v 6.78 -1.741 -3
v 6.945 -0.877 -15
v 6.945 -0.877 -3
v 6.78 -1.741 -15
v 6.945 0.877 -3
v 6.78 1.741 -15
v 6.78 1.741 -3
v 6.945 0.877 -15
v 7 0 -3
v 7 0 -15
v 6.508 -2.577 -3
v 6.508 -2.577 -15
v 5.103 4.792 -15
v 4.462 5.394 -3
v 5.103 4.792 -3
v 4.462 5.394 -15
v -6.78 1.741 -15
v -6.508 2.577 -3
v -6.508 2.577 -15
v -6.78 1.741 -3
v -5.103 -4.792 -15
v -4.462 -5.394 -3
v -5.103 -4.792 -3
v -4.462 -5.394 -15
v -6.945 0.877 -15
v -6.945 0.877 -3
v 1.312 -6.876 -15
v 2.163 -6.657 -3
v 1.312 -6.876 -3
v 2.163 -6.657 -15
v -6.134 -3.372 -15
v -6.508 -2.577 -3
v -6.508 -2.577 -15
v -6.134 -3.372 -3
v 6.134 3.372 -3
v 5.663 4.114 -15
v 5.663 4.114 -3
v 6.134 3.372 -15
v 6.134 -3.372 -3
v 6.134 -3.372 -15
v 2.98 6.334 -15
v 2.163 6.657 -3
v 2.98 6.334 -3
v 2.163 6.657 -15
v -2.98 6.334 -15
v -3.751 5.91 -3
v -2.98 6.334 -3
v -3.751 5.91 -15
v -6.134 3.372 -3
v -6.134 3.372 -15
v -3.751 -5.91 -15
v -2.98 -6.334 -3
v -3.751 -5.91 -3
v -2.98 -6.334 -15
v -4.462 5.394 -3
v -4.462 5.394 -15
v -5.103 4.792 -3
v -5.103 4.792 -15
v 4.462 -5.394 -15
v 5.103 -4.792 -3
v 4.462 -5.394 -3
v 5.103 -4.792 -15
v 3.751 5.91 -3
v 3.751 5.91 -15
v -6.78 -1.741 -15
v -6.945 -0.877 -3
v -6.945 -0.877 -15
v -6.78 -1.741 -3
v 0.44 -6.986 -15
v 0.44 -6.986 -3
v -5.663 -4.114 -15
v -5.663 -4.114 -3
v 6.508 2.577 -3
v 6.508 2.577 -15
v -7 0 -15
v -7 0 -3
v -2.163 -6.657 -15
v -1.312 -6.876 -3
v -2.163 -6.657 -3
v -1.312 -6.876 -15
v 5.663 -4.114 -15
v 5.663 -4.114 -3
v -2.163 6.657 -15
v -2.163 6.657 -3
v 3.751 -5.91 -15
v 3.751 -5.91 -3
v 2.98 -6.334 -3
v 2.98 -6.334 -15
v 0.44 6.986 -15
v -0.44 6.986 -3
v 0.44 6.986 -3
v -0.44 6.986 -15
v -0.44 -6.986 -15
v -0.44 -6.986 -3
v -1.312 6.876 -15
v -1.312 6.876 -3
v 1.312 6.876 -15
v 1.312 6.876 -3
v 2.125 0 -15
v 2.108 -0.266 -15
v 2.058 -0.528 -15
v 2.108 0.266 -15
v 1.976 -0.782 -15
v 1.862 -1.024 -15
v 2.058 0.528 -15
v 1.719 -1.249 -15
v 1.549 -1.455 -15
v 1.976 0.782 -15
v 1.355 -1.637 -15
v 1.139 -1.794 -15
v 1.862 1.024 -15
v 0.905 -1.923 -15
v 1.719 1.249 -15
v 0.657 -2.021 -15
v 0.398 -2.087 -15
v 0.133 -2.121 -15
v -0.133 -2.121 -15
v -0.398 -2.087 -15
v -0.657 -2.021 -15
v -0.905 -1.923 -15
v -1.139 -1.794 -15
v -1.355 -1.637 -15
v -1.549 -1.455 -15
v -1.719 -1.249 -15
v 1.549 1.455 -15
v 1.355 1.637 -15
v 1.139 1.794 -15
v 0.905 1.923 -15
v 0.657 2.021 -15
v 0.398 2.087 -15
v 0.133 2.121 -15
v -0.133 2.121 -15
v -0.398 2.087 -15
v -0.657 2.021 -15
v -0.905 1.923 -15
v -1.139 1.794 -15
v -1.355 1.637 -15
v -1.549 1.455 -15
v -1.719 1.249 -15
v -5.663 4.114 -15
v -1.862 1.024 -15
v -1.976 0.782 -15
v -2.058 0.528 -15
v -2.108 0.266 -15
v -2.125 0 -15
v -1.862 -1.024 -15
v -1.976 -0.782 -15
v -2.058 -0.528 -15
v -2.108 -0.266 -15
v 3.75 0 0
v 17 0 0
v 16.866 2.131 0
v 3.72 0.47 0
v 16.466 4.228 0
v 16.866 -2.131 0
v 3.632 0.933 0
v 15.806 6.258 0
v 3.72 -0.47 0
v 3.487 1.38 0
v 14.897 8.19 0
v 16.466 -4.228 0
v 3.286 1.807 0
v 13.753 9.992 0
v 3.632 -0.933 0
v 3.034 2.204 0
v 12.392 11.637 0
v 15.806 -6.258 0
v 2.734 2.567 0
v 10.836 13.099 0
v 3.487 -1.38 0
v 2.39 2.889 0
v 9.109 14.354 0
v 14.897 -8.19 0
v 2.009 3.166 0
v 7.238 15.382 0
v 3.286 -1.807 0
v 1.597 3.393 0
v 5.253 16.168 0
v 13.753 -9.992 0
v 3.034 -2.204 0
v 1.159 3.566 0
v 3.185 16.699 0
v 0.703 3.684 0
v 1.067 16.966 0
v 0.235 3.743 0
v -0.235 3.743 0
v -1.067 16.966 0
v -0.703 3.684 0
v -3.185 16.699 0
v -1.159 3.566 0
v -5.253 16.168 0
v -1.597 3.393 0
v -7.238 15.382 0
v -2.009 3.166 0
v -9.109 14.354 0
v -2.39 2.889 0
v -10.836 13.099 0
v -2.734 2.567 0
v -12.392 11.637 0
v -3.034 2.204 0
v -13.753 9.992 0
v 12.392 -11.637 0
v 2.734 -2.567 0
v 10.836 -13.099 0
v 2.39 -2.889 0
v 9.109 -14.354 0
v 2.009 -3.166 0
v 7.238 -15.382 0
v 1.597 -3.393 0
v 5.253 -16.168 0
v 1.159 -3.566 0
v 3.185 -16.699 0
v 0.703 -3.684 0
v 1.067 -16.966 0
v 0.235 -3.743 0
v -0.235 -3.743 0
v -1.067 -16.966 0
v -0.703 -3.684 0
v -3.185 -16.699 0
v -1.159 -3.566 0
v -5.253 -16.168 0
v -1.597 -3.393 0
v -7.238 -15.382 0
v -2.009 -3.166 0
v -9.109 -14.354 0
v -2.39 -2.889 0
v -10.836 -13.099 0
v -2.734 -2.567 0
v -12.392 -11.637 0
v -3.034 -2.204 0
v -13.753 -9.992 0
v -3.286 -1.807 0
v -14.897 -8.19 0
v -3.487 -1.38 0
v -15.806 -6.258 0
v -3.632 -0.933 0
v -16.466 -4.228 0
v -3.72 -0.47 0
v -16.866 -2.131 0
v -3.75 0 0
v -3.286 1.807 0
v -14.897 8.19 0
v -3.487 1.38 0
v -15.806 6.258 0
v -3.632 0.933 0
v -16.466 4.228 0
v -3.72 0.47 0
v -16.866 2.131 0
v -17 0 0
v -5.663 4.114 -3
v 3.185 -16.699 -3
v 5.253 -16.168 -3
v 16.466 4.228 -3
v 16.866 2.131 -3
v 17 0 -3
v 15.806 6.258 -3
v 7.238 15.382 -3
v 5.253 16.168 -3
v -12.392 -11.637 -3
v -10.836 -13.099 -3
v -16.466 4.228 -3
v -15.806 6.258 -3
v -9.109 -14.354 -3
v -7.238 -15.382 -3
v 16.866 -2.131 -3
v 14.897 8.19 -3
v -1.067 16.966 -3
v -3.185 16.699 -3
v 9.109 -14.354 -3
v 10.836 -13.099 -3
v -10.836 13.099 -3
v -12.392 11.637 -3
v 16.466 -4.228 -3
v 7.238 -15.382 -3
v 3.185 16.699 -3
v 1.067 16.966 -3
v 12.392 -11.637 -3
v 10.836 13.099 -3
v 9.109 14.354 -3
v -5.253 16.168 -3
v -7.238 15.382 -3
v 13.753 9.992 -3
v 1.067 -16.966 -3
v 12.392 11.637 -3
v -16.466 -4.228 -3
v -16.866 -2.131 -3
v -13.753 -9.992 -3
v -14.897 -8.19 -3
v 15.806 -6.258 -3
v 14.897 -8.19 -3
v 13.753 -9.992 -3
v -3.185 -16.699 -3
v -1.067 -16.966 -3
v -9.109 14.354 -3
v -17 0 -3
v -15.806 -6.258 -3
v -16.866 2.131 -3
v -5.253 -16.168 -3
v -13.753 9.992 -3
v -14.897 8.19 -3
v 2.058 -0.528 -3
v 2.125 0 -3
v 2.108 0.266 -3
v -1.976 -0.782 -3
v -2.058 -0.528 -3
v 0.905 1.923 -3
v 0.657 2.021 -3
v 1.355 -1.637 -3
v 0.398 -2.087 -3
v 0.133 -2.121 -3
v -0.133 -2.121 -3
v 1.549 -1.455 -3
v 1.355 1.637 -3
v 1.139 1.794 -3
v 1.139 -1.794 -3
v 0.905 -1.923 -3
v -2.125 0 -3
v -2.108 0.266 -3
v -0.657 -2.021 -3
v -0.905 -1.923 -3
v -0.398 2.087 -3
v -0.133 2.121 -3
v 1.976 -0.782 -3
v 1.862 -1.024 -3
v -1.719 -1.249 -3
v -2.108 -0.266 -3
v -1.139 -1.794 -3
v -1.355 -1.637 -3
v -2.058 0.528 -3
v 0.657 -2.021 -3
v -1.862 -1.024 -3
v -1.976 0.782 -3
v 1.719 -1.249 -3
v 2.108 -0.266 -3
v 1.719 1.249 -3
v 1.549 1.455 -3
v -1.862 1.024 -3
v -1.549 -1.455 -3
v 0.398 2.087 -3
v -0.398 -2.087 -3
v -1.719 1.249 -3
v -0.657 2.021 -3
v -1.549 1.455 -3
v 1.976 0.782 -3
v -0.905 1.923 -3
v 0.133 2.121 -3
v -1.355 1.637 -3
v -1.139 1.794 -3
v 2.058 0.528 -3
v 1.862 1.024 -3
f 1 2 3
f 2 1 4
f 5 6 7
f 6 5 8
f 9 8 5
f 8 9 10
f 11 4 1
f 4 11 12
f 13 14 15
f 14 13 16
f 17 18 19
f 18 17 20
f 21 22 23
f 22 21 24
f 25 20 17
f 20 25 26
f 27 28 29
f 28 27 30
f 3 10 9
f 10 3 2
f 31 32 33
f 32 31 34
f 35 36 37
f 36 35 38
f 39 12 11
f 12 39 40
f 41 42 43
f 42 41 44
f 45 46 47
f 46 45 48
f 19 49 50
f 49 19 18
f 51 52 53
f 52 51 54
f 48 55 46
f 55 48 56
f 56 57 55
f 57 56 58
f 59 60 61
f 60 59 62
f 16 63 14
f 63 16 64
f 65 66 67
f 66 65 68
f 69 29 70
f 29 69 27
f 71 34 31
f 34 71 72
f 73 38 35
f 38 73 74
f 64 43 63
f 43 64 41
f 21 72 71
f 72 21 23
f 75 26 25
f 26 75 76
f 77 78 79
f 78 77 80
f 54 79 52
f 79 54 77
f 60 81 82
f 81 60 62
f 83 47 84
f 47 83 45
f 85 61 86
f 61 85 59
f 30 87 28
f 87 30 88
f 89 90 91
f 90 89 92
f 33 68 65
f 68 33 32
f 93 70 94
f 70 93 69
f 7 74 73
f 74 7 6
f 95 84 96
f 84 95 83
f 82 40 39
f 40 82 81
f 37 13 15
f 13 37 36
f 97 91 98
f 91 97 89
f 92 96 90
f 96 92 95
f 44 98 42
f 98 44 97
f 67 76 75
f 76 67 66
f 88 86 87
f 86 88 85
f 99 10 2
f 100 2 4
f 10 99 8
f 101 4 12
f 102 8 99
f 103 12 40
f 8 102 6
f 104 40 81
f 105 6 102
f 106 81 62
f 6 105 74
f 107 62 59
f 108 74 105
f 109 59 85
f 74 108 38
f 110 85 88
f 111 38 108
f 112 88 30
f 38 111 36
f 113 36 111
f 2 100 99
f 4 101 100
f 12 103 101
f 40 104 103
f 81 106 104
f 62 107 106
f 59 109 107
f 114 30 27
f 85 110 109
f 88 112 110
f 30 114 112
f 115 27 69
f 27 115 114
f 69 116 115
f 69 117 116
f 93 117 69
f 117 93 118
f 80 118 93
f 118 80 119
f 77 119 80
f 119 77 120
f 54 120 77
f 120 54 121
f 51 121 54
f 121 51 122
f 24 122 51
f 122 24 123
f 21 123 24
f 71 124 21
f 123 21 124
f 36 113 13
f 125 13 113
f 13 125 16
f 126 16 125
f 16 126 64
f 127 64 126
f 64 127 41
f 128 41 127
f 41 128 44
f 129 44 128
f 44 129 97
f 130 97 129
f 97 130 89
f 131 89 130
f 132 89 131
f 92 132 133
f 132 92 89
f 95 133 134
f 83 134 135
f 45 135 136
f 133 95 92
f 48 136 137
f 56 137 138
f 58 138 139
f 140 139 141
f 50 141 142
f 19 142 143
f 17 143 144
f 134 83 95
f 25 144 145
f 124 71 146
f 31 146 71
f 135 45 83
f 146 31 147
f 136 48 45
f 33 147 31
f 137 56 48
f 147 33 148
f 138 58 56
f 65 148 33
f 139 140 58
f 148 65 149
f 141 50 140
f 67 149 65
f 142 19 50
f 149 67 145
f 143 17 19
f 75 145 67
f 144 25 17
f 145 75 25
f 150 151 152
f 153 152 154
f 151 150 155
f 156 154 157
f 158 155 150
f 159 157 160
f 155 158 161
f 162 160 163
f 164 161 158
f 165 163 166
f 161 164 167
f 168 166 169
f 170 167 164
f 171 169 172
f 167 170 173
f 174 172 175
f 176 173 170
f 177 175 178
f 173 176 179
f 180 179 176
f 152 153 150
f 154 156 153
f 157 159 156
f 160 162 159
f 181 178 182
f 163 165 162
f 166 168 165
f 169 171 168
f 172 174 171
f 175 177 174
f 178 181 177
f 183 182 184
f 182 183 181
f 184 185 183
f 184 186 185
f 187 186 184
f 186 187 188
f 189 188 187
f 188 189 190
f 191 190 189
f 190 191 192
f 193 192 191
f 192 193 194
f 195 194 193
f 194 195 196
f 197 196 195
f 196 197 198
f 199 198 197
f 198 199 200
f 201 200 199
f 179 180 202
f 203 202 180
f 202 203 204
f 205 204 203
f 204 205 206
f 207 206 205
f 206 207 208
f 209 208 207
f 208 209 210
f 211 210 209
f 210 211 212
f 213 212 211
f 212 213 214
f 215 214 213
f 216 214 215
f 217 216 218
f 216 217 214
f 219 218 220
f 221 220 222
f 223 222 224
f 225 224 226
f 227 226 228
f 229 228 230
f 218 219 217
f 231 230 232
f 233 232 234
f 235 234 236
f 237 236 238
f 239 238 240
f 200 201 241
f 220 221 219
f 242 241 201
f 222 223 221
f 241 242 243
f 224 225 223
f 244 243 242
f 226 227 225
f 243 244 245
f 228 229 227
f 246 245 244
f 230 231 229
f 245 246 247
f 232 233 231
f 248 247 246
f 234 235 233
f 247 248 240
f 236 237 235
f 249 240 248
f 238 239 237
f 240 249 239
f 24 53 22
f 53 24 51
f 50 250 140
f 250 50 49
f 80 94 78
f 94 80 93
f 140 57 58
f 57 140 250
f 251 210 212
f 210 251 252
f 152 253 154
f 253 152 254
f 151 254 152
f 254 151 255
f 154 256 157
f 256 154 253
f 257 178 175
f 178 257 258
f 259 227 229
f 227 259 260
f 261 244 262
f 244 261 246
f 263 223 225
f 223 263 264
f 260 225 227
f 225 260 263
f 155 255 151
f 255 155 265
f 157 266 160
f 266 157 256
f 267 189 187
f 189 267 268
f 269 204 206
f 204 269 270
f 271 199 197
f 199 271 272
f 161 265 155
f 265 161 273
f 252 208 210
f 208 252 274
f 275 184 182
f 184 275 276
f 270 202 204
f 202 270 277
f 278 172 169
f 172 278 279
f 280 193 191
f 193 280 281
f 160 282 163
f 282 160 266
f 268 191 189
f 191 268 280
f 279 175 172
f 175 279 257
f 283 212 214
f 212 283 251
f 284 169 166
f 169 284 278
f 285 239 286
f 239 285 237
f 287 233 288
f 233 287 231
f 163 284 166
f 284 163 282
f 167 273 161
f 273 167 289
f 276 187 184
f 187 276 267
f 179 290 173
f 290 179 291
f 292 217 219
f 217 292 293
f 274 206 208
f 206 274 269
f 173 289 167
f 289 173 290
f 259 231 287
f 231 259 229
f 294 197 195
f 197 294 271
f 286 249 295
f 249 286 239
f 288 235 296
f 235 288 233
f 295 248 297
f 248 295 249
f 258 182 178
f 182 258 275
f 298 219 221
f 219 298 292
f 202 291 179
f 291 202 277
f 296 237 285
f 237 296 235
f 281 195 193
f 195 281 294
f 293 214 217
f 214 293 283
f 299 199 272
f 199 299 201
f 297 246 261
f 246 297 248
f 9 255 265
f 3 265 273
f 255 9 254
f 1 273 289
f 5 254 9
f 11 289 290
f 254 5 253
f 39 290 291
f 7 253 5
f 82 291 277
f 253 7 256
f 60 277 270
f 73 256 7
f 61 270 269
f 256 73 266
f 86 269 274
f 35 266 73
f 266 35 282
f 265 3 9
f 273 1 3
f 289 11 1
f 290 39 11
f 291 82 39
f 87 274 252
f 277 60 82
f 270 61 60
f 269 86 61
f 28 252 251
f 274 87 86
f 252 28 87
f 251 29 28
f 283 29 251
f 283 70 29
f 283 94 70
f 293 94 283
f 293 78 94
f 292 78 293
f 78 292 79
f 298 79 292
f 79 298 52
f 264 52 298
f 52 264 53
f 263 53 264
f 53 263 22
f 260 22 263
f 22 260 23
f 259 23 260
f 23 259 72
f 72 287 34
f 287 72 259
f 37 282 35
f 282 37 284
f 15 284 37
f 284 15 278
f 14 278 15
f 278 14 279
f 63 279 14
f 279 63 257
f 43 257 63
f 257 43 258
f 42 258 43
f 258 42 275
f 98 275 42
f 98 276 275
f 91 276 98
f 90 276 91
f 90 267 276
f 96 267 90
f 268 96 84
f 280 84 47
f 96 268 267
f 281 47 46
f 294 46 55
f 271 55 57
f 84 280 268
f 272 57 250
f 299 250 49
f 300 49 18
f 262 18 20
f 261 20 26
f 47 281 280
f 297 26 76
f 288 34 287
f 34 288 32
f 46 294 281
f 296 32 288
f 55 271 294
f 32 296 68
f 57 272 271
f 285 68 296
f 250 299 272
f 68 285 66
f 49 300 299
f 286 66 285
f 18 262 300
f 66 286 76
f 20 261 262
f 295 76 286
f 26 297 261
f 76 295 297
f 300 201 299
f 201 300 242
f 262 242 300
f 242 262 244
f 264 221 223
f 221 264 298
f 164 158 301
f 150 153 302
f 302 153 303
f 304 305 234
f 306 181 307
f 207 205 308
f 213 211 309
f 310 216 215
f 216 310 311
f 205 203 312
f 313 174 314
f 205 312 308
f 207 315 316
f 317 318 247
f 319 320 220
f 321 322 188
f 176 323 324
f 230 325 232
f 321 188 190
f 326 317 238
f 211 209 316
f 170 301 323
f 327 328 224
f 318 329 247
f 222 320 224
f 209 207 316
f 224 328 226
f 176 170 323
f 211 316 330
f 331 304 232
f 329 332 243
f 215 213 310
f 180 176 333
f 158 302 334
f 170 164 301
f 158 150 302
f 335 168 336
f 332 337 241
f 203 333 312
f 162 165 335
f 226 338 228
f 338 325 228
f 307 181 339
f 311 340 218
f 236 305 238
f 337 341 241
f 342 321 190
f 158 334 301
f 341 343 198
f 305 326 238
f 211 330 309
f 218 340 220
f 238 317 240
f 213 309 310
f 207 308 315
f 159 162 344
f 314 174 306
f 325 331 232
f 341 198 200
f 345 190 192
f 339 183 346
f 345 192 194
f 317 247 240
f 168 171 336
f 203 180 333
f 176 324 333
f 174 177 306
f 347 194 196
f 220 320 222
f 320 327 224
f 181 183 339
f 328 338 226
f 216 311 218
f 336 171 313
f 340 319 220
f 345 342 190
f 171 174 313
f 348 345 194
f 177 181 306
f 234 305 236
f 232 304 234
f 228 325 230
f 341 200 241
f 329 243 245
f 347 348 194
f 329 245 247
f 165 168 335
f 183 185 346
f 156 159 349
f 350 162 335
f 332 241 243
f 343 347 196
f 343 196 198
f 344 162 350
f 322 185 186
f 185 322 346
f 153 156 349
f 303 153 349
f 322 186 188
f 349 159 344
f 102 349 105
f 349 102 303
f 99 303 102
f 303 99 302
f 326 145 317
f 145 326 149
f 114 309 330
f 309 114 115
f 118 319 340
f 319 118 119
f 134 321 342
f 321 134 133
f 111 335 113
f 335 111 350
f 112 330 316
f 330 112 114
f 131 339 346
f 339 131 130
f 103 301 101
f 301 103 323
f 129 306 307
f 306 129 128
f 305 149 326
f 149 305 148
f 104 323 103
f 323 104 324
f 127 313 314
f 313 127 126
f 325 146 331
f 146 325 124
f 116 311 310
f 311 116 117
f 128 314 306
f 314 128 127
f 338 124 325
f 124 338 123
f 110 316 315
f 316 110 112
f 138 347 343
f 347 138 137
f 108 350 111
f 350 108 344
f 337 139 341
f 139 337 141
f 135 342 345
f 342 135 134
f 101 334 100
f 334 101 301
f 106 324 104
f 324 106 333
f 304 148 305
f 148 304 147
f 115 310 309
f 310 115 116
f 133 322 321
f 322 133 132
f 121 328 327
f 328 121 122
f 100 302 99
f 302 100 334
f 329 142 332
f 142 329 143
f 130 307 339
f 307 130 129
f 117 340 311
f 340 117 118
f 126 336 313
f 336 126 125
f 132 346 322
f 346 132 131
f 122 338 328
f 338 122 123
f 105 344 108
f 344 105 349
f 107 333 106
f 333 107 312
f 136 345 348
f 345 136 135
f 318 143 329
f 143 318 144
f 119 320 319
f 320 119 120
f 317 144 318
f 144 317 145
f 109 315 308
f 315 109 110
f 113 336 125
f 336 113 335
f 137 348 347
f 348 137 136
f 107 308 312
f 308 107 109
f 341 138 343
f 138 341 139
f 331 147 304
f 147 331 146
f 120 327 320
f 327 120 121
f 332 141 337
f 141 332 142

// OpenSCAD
$fn = 50;


difference() {
	union() {
		translate(v = [0, 0, -15.0000000000]) {
			cylinder(h = 15, r = 7.0000000000);
		}
		translate(v = [0, 0, -3.0000000000]) {
			cylinder(h = 3, r = 17.0000000000);
		}
	}
	union() {
		translate(v = [0, 0, 0]) {
			rotate(a = [0, 0, 0]) {
				difference() {
					union() {
						#translate(v = [0, 0, -15.0000000000]) {
							cylinder(h = 15, r = 2.0000000000);
						}
						#translate(v = [0, 0, -3]) {
							cylinder(h = 3, r = 7.0000000000, r1 = 2.1250000000, r2 = 3.7500000000);
						}
						#translate(v = [0, 0, -15.0000000000]) {
							cylinder(h = 15, r = 2.1250000000);
						}
						#translate(v = [0, 0, -15.0000000000]) {
							cylinder(h = 15, r = 2.0000000000);
						}
					}
					union();
				}
			}
		}
	}
}
